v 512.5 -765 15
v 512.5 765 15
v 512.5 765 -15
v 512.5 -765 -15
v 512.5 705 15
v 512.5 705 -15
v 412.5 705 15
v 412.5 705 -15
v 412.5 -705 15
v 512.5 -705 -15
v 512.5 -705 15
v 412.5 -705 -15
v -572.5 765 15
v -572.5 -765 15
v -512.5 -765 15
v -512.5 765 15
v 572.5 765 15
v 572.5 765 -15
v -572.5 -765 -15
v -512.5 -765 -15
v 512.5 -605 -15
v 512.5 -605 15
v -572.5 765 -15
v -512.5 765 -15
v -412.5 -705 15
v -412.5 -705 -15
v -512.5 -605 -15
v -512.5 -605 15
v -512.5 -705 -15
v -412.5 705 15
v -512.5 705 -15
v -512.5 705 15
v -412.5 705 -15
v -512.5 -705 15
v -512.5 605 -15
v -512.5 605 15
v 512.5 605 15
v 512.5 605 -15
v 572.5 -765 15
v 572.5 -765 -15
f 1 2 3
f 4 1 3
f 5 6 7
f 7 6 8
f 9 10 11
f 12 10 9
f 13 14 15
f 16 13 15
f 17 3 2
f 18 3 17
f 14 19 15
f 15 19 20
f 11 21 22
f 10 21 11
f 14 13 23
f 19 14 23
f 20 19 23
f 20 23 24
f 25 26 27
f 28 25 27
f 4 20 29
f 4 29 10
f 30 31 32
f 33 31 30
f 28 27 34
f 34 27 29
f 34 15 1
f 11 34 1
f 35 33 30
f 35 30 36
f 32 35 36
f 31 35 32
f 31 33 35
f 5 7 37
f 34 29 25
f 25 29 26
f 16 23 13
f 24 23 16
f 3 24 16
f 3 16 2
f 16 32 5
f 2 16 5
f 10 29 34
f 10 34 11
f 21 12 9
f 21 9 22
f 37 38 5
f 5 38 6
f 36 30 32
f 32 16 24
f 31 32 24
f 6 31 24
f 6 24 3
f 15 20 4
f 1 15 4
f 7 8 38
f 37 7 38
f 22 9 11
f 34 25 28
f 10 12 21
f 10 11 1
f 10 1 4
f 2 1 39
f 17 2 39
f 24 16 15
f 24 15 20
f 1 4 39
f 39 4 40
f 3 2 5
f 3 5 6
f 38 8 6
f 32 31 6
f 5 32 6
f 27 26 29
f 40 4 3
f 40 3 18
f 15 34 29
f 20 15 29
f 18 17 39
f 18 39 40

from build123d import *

# Parameters (mm, degrees)
MEMBER_START                 = -765
MEMBER_20_X_20_1_OUTLINE_W   = 60
MEMBER_20_X_20_1_OUTLINE_H   = 30
MEMBER_20_X_20_1_DEPTH       = 1530
MEMBER_20_X_20_1_2_OUTLINE_W = 1025
MEMBER_20_X_20_1_2_OUTLINE_H = 30
MEMBER_20_X_20_1_2_DEPTH     = 60
MEMBER_START_2               = 705
MEMBER_20_X_20_1_3_OUTLINE_W = 1025
MEMBER_20_X_20_1_3_OUTLINE_H = 30
MEMBER_20_X_20_1_3_DEPTH     = 60
GUSSET_1_THICKNESS           = 30


# Read off the part's stored shape, not the designer's step: Квадрат 20 X 20(1)
with BuildPart() as part:
    # Member 20 X 20_1 outline → Member 20 X 20_1 (new body)
    with BuildSketch(Plane(origin=(0, 0, 0), x_dir=(1, 0, 0), z_dir=(0, 1, 0)).offset(MEMBER_START)):
        with Locations((542.5, 0)):
            Rectangle(MEMBER_20_X_20_1_OUTLINE_W, MEMBER_20_X_20_1_OUTLINE_H)
        with Locations((-542.5, 0)):
            Rectangle(MEMBER_20_X_20_1_OUTLINE_W, MEMBER_20_X_20_1_OUTLINE_H)
    extrude(amount=MEMBER_20_X_20_1_DEPTH)


with BuildPart() as body_2:
    # Member 20 X 20_1 2 outline → Member 20 X 20_1 2 (new body)
    with BuildSketch(Plane(origin=(0, 0, 0), x_dir=(1, 0, 0), z_dir=(0, 1, 0)).offset(MEMBER_START)):
        Rectangle(MEMBER_20_X_20_1_2_OUTLINE_W, MEMBER_20_X_20_1_2_OUTLINE_H)
    extrude(amount=MEMBER_20_X_20_1_2_DEPTH)


with BuildPart() as body_3:
    # Member 20 X 20_1 3 outline → Member 20 X 20_1 3 (new body)
    with BuildSketch(Plane(origin=(0, 0, 0), x_dir=(1, 0, 0), z_dir=(0, 1, 0)).offset(MEMBER_START_2)):
        Rectangle(MEMBER_20_X_20_1_3_OUTLINE_W, MEMBER_20_X_20_1_3_OUTLINE_H)
    extrude(amount=MEMBER_20_X_20_1_3_DEPTH)


with BuildPart() as body_4:
    # Gusset 1: a gusset: a plate 30.0 thick in the corner of two members, its outline drawn in place
    gusset_1_outline = Wire([Line((-512.5, 705, -15), (-412.5, 705, -15)), Line((-412.5, 705, -15), (-512.5, 605, -15)), Line((-512.5, 605, -15), (-512.5, 705, -15))])
    add(extrude(Face(gusset_1_outline), amount=GUSSET_1_THICKNESS, dir=(0, 0, 1)))


with BuildPart() as body_5:
    # Зеркальное отражение2: mirrored copy
    add(body_4.part.mirror(Plane(origin=(0, 0, 0), x_dir=(0, 0, 1), z_dir=(1, 0, 0))))


with BuildPart() as body_6:
    # Зеркальное отражение3: mirrored copy
    add(body_4.part.mirror(Plane.ZX))


with BuildPart() as body_7:
    # Mirror 3 2: mirrored copy
    add(body_5.part.mirror(Plane.ZX))


solid = Compound([part.part, body_2.part, body_3.part, body_4.part, body_5.part, body_6.part, body_7.part])
